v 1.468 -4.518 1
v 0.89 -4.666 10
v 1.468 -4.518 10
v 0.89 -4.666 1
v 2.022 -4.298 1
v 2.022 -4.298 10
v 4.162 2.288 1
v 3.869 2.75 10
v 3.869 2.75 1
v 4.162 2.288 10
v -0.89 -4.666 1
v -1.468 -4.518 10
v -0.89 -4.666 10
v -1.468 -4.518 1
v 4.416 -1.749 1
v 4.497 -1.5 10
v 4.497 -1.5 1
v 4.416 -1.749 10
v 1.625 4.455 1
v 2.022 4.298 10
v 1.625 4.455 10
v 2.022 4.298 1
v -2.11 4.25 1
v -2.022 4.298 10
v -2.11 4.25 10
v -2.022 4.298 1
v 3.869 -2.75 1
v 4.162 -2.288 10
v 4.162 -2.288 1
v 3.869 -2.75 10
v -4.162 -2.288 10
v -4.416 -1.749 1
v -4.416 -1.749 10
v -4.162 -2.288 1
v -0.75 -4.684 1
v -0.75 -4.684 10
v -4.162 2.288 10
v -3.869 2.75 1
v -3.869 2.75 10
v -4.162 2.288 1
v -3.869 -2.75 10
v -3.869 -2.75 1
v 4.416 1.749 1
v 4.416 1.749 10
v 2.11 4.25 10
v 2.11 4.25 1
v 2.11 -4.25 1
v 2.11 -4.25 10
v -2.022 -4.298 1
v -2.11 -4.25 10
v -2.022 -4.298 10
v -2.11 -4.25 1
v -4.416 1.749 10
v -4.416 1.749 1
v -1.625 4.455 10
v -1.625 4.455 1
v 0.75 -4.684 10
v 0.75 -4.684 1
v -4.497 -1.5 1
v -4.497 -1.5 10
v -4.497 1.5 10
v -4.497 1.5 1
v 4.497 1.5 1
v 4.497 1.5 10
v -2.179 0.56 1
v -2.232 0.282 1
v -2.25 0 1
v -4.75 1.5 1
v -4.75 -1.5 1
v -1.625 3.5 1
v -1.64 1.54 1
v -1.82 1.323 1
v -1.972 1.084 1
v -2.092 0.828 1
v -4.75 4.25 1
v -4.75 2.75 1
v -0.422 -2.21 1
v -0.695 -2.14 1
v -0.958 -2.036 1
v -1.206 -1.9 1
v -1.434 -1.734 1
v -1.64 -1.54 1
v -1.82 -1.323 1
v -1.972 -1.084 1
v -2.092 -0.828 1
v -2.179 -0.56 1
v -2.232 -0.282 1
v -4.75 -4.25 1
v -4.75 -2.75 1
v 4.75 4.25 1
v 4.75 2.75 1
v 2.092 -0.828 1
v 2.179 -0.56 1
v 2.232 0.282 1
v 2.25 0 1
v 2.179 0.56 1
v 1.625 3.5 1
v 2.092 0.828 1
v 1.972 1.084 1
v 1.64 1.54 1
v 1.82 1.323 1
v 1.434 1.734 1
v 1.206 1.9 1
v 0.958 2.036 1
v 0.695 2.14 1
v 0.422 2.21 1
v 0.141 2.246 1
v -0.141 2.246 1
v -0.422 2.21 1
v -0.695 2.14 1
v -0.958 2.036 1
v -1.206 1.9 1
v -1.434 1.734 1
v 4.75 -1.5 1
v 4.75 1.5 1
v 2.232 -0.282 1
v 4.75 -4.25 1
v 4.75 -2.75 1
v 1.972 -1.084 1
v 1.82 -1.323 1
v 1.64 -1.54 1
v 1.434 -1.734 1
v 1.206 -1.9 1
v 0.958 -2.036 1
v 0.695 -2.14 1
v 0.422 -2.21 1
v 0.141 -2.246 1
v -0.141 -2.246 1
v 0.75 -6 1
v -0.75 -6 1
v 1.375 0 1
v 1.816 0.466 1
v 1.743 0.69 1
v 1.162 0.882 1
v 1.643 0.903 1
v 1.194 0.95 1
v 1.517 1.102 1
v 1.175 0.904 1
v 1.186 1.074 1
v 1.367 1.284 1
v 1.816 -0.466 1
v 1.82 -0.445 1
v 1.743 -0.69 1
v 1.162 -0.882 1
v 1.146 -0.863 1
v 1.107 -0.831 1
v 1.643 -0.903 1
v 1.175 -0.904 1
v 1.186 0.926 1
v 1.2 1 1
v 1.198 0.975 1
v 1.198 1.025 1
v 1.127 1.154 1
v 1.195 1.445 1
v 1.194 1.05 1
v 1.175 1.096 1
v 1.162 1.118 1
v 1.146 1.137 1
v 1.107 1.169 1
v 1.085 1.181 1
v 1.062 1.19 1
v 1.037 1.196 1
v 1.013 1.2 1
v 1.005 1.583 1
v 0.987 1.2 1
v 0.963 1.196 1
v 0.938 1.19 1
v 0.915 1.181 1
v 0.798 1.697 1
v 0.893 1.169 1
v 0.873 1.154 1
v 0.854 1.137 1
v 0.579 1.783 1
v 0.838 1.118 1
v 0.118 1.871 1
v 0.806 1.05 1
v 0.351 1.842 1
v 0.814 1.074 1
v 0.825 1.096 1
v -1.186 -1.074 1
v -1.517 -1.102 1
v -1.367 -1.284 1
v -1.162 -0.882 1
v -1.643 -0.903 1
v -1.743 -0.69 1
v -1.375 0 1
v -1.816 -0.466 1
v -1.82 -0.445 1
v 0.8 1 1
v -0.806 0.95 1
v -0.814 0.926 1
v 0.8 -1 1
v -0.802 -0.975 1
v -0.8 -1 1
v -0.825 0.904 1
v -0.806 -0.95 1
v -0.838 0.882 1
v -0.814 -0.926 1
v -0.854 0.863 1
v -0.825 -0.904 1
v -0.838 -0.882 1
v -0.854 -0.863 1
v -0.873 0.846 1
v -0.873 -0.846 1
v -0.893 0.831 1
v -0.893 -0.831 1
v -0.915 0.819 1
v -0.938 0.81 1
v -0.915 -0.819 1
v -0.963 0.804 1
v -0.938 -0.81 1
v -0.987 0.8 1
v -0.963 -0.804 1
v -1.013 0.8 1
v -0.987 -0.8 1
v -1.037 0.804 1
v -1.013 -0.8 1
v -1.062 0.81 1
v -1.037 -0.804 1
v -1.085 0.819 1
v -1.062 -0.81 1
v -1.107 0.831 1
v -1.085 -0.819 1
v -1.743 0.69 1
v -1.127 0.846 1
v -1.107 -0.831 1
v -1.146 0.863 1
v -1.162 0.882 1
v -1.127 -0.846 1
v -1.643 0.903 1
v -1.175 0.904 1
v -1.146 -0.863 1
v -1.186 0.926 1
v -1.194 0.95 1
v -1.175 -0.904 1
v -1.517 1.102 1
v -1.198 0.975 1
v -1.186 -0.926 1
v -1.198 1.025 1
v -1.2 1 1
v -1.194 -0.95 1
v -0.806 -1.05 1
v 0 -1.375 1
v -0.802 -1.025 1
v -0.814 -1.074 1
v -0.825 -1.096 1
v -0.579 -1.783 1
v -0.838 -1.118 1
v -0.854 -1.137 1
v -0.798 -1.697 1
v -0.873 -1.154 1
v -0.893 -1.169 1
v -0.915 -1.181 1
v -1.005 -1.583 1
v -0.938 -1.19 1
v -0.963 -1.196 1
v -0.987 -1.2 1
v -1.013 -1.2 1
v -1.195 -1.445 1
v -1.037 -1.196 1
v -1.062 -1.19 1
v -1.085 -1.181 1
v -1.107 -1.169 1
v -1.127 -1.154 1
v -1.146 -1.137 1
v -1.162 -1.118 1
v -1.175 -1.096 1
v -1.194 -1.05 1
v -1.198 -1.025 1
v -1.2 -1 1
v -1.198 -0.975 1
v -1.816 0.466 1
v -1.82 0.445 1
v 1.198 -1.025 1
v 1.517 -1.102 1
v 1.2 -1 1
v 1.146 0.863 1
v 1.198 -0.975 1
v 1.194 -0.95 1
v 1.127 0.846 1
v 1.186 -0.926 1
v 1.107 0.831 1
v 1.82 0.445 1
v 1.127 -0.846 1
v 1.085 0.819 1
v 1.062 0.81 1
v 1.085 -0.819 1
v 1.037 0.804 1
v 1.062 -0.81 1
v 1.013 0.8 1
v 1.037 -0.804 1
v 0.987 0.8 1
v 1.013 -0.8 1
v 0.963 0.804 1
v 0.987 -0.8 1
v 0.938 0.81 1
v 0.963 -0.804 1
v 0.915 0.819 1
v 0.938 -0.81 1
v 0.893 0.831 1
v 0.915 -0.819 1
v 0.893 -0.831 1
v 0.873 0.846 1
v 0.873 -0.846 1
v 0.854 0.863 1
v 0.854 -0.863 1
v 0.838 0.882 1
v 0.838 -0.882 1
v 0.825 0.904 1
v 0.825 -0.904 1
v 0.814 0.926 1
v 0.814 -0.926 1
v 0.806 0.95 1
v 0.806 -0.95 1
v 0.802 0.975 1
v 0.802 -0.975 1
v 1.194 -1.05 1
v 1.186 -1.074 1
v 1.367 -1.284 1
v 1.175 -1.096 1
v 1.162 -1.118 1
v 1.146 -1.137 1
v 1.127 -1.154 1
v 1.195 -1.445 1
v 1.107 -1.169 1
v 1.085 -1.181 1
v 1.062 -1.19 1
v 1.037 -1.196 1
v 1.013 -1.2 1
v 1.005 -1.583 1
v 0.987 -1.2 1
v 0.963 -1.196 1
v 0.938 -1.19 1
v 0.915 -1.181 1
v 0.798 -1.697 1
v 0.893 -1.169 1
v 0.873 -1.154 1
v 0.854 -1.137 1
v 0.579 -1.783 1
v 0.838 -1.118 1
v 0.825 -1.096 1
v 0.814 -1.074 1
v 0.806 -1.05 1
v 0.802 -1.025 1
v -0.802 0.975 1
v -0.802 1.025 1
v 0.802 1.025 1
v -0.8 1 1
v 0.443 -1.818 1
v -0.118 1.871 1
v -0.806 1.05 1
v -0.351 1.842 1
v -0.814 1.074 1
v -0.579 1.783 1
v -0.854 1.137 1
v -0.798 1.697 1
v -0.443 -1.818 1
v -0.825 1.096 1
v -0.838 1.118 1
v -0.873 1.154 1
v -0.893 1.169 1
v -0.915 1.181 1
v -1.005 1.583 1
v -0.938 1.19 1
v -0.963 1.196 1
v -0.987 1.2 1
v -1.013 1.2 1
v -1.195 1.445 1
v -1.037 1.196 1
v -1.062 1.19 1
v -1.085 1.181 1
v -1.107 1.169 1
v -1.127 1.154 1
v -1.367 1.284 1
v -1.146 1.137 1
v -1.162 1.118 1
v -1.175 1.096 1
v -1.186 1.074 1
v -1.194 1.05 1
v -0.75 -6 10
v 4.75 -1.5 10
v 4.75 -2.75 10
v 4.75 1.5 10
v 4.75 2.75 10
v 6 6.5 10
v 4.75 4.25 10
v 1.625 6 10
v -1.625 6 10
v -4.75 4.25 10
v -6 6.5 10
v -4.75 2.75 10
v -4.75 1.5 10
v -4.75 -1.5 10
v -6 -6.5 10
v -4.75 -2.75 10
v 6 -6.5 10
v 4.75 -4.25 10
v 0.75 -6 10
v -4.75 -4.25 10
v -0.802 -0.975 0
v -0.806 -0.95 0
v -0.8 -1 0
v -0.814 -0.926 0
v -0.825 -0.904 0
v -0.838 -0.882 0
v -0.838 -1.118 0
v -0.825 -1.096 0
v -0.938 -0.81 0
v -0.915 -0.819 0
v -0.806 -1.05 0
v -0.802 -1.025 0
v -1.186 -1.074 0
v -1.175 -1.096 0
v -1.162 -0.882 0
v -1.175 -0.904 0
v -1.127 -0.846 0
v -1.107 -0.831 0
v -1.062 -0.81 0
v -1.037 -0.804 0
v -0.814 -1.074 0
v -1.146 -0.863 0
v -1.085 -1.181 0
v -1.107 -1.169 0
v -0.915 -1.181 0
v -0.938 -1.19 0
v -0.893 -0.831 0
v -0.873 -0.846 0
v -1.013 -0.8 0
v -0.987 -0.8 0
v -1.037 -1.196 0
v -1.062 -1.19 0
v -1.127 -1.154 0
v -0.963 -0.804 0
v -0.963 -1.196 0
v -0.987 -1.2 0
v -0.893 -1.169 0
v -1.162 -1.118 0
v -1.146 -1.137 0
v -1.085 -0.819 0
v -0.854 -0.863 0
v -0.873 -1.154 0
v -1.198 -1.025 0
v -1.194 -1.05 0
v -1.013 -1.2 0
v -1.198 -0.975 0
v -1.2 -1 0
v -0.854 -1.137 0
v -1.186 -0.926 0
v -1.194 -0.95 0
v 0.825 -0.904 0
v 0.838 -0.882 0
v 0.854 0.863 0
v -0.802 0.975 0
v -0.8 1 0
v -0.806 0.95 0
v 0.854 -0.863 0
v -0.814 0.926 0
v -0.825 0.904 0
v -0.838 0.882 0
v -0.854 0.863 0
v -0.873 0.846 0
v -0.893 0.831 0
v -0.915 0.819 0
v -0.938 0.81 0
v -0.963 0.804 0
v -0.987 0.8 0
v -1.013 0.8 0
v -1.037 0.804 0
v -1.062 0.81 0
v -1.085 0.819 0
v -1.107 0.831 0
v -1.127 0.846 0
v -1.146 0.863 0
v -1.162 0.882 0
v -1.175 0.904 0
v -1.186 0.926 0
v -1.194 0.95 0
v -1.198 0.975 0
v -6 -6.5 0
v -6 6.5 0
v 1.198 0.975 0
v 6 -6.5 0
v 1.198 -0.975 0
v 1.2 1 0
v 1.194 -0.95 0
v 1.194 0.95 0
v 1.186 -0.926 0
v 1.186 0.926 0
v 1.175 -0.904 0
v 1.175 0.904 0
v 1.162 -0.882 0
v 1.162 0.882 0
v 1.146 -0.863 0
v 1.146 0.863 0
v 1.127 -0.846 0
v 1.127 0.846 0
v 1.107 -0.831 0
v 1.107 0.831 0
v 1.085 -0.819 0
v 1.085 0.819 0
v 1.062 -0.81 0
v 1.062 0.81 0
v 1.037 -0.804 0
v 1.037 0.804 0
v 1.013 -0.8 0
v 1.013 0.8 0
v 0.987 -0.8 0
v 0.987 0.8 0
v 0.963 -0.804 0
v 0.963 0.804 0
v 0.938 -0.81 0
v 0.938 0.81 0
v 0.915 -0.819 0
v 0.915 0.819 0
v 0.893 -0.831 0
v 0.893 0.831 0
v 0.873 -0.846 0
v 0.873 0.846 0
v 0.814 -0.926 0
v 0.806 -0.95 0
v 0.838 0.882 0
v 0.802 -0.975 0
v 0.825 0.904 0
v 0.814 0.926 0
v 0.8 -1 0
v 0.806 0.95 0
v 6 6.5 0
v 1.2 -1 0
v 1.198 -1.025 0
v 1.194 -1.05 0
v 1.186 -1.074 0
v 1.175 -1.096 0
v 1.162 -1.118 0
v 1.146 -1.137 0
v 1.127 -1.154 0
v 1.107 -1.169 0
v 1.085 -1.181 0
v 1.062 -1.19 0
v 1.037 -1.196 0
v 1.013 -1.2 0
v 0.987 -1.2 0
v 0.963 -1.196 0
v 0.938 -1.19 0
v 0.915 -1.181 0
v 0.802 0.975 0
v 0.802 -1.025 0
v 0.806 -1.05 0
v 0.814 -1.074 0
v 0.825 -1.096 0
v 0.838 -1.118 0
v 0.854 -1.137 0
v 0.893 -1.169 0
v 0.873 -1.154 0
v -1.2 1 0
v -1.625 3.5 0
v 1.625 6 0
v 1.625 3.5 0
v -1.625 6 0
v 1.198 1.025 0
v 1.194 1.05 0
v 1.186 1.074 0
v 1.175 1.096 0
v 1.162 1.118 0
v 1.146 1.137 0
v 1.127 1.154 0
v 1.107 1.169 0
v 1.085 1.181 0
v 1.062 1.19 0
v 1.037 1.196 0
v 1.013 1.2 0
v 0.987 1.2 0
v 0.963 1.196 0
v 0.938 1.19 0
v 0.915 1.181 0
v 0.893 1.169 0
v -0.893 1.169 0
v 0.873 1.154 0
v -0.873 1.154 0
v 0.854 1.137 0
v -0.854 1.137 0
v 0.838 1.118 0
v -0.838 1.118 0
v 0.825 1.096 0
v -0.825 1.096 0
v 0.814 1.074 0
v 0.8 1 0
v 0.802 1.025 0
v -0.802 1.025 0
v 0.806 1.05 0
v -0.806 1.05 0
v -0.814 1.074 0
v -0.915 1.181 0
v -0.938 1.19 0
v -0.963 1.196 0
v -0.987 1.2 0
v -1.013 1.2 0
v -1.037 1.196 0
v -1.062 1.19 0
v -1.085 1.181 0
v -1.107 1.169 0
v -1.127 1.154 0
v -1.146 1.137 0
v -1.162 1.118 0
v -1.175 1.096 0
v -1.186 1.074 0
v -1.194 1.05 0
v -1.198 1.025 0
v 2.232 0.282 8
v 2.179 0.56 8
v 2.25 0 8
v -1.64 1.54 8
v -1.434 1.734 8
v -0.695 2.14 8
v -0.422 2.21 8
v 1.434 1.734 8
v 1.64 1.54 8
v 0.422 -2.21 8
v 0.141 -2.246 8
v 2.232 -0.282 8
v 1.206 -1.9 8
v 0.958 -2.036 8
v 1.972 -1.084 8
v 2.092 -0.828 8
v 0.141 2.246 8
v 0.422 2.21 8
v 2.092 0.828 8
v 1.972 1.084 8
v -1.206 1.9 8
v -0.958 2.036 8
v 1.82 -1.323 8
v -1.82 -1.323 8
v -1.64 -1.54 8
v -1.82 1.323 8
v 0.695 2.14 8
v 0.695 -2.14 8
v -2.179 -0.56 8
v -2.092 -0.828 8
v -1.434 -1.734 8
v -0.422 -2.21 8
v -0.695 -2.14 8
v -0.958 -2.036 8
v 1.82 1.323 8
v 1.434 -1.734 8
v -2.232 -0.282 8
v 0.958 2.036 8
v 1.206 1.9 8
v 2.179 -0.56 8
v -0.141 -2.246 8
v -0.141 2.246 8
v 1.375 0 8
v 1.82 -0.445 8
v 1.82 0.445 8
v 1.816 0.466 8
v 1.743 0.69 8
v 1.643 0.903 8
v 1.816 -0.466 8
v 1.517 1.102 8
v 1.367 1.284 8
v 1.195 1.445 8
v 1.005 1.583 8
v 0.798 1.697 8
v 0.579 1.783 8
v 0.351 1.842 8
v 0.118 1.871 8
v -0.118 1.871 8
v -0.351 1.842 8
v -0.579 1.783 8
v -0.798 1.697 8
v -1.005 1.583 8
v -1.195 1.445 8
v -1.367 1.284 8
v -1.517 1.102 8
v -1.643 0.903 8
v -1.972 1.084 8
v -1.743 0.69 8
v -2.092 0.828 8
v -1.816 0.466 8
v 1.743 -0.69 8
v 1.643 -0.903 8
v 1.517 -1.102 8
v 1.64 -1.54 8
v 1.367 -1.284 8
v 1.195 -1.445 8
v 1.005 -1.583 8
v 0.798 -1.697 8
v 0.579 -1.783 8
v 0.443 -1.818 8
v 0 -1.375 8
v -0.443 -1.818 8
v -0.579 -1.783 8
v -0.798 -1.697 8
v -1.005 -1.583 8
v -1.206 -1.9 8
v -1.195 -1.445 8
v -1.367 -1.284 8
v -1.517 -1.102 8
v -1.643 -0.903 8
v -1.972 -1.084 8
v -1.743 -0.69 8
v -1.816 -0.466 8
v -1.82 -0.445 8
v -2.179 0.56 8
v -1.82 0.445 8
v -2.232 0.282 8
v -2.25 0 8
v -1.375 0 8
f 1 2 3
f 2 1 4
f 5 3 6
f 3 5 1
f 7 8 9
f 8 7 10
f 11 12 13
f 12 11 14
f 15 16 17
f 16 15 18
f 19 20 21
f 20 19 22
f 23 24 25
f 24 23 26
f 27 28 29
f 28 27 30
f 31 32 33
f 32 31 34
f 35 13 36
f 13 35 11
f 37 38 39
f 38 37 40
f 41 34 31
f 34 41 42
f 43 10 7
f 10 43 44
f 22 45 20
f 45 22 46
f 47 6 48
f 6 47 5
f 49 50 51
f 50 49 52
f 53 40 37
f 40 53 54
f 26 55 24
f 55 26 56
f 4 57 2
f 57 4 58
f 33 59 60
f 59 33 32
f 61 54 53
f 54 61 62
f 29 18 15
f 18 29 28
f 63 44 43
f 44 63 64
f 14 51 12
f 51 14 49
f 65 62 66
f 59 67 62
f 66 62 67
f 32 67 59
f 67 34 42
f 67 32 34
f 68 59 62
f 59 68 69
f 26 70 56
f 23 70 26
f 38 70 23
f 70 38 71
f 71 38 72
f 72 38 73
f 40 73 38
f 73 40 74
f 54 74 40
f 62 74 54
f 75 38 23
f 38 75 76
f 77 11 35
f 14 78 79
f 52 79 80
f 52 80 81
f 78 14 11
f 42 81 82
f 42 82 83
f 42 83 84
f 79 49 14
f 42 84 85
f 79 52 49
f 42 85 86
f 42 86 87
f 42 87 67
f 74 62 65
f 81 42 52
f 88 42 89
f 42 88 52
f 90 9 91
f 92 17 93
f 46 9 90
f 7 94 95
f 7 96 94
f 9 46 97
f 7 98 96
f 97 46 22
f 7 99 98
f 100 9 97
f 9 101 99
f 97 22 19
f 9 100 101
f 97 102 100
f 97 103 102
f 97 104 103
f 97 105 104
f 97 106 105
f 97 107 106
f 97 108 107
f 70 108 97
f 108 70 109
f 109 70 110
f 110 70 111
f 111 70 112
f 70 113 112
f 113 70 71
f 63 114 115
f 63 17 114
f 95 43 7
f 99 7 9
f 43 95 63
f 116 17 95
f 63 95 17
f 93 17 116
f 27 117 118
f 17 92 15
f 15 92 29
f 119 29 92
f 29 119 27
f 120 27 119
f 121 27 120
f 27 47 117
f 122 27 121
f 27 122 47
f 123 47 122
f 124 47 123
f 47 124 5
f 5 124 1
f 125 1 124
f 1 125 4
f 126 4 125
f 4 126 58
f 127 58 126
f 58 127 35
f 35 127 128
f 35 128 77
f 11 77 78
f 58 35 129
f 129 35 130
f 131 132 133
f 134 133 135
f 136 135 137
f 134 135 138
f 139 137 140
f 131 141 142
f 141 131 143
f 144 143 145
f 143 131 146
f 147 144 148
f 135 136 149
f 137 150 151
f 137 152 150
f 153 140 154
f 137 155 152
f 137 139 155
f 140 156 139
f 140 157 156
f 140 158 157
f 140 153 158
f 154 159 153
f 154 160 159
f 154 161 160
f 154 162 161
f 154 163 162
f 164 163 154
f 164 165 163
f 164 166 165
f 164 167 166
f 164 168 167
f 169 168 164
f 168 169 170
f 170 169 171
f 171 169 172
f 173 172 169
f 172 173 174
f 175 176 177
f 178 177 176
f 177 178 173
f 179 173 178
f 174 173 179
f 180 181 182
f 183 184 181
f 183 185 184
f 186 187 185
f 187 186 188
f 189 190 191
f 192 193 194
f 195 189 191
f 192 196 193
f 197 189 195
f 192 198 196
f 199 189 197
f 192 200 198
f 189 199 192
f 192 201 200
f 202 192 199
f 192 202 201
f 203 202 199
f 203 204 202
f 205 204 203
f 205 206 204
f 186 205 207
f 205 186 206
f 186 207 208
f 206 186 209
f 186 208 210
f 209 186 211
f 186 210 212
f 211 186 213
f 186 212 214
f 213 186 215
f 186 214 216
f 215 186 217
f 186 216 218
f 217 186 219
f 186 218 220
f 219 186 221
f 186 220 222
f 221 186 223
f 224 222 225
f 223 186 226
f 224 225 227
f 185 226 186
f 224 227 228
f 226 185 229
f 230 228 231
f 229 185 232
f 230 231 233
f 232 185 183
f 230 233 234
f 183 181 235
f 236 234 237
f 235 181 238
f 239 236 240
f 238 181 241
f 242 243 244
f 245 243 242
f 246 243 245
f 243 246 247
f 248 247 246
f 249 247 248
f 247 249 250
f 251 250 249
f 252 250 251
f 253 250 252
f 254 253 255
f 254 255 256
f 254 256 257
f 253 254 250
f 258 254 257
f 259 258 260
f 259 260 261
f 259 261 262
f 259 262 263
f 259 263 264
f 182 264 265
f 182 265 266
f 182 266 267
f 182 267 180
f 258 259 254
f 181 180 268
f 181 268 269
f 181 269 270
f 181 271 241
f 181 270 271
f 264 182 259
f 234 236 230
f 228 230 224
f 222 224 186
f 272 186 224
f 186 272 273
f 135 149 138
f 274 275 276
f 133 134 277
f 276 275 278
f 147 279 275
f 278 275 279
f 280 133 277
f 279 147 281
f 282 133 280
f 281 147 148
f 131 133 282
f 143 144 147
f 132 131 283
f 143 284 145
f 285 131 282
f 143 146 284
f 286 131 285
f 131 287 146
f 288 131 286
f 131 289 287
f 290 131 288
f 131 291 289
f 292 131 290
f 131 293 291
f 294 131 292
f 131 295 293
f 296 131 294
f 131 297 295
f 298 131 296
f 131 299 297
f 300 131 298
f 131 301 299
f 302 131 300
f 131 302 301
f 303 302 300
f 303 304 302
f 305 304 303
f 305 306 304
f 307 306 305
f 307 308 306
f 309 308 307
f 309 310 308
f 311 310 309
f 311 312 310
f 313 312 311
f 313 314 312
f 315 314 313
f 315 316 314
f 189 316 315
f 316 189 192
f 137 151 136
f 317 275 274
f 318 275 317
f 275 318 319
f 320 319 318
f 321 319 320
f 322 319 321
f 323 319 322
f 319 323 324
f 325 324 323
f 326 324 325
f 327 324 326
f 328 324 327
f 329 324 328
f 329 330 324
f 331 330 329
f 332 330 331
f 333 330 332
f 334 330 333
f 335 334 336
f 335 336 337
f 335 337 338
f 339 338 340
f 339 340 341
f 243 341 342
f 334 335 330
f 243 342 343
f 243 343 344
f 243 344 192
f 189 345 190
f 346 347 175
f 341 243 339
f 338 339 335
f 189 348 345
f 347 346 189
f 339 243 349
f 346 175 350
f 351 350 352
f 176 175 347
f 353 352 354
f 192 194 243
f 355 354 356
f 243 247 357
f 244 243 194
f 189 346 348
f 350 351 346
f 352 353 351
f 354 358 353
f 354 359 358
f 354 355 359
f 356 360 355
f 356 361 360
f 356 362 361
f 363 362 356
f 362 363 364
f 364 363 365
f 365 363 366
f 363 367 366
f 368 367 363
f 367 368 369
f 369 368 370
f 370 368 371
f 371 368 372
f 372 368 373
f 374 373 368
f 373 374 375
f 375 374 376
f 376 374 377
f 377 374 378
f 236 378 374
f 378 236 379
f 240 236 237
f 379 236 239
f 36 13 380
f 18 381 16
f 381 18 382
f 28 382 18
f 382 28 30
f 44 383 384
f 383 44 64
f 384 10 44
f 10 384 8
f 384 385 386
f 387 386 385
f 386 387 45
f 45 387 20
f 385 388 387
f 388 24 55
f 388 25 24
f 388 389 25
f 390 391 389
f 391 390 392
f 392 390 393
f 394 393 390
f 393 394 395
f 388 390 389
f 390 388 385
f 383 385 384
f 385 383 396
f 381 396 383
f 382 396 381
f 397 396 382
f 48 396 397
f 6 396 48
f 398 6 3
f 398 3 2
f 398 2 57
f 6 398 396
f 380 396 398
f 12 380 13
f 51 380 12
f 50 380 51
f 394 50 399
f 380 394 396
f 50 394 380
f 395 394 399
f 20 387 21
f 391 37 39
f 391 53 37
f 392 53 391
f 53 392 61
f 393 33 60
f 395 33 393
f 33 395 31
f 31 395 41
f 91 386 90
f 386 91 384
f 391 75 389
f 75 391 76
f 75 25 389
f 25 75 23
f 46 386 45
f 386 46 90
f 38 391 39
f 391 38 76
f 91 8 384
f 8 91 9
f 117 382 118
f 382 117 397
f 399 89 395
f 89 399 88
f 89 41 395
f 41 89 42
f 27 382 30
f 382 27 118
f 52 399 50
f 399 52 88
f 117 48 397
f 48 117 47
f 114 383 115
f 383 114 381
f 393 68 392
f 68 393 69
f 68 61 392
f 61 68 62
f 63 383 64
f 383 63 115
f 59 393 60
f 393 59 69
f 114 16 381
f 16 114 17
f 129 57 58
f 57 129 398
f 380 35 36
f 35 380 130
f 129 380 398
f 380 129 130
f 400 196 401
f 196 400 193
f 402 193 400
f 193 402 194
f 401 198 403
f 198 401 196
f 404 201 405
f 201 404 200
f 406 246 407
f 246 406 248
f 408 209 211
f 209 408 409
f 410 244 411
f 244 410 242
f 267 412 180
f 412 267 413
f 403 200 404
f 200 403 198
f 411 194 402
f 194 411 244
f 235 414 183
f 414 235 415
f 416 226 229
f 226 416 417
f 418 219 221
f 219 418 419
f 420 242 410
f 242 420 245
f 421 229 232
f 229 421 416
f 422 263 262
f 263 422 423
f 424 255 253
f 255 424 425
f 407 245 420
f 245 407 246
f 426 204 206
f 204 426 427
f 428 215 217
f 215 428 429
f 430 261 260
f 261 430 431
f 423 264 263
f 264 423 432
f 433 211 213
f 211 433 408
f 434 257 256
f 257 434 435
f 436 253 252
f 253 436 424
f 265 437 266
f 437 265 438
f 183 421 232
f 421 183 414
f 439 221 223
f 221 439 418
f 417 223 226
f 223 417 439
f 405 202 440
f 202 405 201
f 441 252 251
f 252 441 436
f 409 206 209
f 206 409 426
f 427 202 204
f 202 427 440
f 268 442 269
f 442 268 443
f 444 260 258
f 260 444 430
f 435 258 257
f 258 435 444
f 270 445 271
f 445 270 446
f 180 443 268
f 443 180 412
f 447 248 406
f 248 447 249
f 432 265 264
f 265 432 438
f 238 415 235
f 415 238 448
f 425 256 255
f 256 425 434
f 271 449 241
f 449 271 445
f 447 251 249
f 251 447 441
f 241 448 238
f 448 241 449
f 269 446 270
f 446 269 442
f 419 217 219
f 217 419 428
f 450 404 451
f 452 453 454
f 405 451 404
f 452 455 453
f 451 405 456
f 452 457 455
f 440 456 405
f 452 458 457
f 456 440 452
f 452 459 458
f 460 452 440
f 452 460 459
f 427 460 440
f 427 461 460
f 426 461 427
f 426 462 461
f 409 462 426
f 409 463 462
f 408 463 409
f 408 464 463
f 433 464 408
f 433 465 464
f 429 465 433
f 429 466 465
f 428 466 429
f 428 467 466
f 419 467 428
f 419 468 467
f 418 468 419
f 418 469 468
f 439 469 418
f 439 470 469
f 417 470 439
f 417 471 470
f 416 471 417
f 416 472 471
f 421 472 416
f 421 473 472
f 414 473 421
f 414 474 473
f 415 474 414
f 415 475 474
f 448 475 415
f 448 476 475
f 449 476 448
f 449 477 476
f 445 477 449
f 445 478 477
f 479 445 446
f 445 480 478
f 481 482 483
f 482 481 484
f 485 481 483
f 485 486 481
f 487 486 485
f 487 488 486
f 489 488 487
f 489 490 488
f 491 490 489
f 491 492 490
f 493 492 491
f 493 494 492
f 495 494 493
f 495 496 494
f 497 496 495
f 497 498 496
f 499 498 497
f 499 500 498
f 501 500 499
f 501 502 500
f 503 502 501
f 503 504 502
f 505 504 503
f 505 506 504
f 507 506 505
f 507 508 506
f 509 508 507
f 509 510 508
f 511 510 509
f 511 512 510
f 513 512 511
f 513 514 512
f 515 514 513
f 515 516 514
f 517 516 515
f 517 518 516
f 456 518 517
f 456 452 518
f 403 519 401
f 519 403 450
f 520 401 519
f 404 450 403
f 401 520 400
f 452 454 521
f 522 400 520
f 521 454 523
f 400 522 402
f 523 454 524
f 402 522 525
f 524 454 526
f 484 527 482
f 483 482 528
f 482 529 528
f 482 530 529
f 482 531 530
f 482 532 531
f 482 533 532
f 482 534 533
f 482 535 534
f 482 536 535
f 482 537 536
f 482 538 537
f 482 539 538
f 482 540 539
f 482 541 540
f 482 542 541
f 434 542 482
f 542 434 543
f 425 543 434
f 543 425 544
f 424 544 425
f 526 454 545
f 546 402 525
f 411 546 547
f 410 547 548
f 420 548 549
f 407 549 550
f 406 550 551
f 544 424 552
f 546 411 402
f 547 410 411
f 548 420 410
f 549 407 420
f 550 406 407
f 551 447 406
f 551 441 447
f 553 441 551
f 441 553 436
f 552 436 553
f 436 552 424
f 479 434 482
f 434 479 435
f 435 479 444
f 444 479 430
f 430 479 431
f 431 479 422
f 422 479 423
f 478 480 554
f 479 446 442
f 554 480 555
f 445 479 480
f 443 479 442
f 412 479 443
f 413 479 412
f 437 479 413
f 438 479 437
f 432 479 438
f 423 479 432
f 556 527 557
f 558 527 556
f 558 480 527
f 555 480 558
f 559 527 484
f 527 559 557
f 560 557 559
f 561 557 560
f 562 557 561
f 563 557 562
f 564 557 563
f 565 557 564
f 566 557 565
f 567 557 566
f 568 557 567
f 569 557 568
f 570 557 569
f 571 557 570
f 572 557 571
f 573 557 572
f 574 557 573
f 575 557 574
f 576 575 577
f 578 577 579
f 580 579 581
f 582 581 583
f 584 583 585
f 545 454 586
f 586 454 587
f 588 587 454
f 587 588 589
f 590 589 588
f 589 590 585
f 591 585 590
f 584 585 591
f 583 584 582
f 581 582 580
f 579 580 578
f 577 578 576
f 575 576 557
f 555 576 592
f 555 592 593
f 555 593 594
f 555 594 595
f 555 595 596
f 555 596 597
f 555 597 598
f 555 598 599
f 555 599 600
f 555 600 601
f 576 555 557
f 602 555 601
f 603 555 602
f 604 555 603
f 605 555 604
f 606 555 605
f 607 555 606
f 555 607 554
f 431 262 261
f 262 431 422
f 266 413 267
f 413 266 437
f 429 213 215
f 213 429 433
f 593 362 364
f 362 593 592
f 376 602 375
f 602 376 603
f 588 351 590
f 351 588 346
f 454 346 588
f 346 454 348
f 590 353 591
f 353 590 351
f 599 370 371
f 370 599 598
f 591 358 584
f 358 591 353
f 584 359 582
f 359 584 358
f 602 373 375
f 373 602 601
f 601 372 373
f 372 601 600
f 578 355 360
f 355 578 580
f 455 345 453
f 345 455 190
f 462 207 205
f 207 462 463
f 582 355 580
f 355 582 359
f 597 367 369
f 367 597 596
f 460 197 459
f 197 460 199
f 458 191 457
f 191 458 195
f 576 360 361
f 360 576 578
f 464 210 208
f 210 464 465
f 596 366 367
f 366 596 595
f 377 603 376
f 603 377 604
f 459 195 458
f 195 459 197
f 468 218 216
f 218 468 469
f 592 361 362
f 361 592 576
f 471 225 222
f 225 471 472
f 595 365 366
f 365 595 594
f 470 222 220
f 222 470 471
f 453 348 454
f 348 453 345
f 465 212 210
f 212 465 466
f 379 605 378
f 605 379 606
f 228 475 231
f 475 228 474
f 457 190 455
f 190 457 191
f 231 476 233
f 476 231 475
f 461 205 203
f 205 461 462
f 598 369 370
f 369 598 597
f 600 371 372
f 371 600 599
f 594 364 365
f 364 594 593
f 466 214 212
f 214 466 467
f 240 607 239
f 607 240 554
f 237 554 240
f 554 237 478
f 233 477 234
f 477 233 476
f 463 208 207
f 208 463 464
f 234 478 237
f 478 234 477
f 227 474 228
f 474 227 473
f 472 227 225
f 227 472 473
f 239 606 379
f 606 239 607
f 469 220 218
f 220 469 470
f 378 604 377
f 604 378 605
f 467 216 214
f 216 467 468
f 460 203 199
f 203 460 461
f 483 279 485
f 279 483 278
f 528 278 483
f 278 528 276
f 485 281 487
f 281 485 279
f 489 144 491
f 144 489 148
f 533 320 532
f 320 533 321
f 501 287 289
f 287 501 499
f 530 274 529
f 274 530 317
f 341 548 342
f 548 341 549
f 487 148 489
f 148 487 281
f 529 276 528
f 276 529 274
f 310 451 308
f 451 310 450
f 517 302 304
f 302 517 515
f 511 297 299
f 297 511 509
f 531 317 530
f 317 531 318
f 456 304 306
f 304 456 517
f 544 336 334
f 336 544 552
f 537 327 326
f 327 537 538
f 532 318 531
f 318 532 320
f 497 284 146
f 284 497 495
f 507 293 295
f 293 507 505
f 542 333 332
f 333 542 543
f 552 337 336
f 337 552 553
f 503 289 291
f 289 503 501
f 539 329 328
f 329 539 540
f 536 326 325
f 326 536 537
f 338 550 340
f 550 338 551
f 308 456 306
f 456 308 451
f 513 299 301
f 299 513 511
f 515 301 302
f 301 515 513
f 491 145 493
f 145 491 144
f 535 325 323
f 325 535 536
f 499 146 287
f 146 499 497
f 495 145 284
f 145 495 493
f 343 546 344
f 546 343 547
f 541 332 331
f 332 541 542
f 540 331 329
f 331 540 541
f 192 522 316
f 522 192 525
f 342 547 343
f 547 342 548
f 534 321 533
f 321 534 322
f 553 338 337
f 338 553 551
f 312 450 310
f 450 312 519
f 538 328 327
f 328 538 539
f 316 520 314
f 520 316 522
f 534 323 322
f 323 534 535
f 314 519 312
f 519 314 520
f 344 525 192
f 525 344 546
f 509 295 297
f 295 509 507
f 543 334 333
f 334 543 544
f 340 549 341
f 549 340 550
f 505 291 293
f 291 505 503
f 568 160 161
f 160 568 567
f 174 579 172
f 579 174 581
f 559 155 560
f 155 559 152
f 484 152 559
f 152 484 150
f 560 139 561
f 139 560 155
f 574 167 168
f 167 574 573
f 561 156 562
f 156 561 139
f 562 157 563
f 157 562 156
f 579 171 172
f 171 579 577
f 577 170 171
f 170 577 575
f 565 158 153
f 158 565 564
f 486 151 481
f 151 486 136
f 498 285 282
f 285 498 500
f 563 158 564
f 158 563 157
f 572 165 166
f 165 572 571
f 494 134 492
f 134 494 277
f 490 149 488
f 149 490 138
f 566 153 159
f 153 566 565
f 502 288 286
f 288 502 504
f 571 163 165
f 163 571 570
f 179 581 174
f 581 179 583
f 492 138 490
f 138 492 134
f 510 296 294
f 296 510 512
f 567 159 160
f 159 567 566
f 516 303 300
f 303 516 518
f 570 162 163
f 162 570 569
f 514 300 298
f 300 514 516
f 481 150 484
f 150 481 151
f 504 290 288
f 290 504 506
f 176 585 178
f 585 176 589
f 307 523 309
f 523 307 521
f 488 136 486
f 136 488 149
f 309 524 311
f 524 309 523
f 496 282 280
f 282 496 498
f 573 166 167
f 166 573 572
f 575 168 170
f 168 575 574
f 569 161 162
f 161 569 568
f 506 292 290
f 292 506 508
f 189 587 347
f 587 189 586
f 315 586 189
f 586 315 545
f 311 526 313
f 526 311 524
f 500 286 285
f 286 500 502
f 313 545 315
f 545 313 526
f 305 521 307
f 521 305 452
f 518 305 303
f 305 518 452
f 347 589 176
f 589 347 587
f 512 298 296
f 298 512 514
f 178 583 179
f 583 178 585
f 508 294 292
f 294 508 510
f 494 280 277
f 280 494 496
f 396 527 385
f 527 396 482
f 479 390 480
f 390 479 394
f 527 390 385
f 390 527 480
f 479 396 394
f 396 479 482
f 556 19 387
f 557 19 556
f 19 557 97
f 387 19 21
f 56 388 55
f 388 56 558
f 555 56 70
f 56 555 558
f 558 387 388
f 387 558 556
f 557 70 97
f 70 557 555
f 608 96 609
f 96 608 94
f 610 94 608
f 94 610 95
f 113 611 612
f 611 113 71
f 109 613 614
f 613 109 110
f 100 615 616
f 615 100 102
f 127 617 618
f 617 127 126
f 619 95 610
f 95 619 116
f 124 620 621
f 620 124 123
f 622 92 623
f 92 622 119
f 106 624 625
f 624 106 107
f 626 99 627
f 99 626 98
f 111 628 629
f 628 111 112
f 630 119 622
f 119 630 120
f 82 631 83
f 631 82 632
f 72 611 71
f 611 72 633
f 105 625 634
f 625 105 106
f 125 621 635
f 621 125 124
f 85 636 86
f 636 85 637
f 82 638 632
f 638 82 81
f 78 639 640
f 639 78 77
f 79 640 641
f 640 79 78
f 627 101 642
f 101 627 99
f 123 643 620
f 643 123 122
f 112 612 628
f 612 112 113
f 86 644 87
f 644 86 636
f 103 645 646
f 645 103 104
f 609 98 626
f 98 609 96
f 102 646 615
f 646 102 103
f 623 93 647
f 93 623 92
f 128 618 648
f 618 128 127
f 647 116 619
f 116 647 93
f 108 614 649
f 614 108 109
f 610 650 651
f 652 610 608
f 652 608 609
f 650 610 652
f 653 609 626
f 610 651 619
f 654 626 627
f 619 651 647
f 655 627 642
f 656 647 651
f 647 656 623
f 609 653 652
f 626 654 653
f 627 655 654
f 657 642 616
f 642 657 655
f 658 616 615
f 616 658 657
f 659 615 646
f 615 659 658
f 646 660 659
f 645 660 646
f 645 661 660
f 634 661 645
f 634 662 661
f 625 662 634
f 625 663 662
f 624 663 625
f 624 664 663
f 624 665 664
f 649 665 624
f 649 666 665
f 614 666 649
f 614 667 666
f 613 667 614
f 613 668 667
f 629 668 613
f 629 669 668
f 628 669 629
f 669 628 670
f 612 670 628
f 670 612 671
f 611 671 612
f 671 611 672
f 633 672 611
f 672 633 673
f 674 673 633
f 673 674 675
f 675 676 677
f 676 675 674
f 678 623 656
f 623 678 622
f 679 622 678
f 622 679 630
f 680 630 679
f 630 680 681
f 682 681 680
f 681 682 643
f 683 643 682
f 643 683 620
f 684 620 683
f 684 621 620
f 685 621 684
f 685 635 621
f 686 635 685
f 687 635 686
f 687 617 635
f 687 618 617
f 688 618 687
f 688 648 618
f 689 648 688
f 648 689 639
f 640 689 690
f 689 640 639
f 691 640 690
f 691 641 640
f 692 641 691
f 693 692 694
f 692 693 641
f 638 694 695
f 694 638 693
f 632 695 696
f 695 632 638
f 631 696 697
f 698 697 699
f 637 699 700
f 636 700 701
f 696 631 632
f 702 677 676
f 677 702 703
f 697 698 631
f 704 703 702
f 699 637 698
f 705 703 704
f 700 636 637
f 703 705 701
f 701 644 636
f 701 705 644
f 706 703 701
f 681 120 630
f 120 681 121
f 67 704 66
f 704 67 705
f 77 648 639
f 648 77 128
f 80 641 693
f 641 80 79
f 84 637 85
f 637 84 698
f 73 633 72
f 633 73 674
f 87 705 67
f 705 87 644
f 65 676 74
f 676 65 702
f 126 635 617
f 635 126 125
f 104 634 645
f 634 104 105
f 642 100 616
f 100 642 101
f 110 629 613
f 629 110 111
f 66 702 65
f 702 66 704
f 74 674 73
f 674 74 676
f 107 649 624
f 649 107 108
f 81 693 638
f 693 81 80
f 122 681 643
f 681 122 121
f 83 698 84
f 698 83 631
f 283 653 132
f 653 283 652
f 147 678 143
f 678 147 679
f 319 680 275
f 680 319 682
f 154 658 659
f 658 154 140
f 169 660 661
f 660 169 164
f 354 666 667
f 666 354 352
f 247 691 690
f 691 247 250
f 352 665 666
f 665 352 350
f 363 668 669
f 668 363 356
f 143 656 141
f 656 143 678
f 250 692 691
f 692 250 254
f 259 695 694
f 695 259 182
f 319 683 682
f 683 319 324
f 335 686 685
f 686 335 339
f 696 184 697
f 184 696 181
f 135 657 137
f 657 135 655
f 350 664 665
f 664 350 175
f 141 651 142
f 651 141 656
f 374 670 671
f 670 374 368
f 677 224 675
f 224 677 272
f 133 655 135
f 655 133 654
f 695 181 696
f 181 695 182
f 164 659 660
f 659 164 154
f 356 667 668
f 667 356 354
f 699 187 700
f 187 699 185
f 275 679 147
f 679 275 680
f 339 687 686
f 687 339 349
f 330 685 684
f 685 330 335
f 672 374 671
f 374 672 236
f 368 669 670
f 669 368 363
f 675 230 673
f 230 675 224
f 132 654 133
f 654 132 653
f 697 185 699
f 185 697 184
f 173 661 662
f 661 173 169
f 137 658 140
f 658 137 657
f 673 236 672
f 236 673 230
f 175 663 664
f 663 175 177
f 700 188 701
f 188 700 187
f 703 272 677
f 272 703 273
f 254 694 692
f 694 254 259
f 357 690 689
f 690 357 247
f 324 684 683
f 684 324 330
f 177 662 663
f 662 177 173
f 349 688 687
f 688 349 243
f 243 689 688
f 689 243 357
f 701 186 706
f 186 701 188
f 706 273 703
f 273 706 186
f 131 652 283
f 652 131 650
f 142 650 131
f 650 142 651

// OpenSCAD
$fn = 50;

connection_bottom_thickness = 1;

pin_diameter = 0.4;
pin_center_spacing = 2;

alignment_cylinder_inner_diameter = 3.75;
alignment_cylinder_outer_diameter = 4.5;
alignment_cylinder_height = 8;

housing_width = 12;
housing_length = 13;
housing_height = 10;

module wire_paths() {
    translate([-pin_center_spacing / 2, -pin_center_spacing / 2, 0])
        cylinder(h = housing_height, d = pin_diameter);
    translate([-pin_center_spacing / 2, pin_center_spacing / 2, 0])
        cylinder(h = housing_height, d = pin_diameter);
    translate([pin_center_spacing / 2, -pin_center_spacing / 2, 0])
        cylinder(h = housing_height, d = pin_diameter);
    translate([pin_center_spacing / 2, pin_center_spacing / 2, 0])
        cylinder(h = housing_height, d = pin_diameter);
}

module connector_guide() {
    translate([-0.5, -alignment_cylinder_inner_diameter / 2, 0])
        linear_extrude(height = alignment_cylinder_height)
            polygon([[0, 0], [1, 0], [0.5, 0.5]]);
}

module connector() {
    // Alignment ring around connections
    difference() {
        cylinder(h = alignment_cylinder_height, d = alignment_cylinder_outer_diameter);
        cylinder(h = alignment_cylinder_height, d = alignment_cylinder_inner_diameter);
    }

    // Bottom/base of connections
    difference() {
        cylinder(h = connection_bottom_thickness, d = alignment_cylinder_outer_diameter);
        
        wire_paths();
    }
    
    connector_guide();
    rotate([0, 0, -90])
        connector_guide();
    rotate([0, 0, 90])
        connector_guide();
}

housing_lower_thickness = 1;
housing_cutout_diameter = 9.5;

module housing() {
    difference() {
        translate([0, 0, housing_height / 2])
            cube([housing_width, housing_length, housing_height], center = true);
        
        translate([0, 0, housing_lower_thickness]) {
            // Cut out center circle
            cylinder(h = housing_height - housing_lower_thickness, d = housing_cutout_diameter);
            
            // Cut out upper rectangle
            translate([0, 3.5, (housing_height - housing_lower_thickness) / 2])
                cube([housing_cutout_diameter, 1.5, housing_height - housing_lower_thickness], center = true);
            
            // Cut out lower rectangle
            translate([0, -3.5, (housing_height - housing_lower_thickness) / 2])
                cube([housing_cutout_diameter, 1.5, housing_height - housing_lower_thickness], center = true);
            
            // Cut out center rectangle
            translate([0, 0, (housing_height - housing_lower_thickness) / 2])
                cube([housing_cutout_diameter, 3.0, housing_height - housing_lower_thickness], center = true);
            
            // Cut out lower recess
            translate([0, -housing_cutout_diameter/2, (housing_height - housing_lower_thickness) / 2])
                cube([1.5, 5/2, housing_height - housing_lower_thickness], center = true);
        }
        
        // Cut out upper recess
        translate([0, housing_cutout_diameter / 2, housing_height / 2])
            cube([3.25, 5/2, housing_height], center = true);
        
        // Cut out wire pass-thru
        wire_paths();
    }
}

housing();
connector();
